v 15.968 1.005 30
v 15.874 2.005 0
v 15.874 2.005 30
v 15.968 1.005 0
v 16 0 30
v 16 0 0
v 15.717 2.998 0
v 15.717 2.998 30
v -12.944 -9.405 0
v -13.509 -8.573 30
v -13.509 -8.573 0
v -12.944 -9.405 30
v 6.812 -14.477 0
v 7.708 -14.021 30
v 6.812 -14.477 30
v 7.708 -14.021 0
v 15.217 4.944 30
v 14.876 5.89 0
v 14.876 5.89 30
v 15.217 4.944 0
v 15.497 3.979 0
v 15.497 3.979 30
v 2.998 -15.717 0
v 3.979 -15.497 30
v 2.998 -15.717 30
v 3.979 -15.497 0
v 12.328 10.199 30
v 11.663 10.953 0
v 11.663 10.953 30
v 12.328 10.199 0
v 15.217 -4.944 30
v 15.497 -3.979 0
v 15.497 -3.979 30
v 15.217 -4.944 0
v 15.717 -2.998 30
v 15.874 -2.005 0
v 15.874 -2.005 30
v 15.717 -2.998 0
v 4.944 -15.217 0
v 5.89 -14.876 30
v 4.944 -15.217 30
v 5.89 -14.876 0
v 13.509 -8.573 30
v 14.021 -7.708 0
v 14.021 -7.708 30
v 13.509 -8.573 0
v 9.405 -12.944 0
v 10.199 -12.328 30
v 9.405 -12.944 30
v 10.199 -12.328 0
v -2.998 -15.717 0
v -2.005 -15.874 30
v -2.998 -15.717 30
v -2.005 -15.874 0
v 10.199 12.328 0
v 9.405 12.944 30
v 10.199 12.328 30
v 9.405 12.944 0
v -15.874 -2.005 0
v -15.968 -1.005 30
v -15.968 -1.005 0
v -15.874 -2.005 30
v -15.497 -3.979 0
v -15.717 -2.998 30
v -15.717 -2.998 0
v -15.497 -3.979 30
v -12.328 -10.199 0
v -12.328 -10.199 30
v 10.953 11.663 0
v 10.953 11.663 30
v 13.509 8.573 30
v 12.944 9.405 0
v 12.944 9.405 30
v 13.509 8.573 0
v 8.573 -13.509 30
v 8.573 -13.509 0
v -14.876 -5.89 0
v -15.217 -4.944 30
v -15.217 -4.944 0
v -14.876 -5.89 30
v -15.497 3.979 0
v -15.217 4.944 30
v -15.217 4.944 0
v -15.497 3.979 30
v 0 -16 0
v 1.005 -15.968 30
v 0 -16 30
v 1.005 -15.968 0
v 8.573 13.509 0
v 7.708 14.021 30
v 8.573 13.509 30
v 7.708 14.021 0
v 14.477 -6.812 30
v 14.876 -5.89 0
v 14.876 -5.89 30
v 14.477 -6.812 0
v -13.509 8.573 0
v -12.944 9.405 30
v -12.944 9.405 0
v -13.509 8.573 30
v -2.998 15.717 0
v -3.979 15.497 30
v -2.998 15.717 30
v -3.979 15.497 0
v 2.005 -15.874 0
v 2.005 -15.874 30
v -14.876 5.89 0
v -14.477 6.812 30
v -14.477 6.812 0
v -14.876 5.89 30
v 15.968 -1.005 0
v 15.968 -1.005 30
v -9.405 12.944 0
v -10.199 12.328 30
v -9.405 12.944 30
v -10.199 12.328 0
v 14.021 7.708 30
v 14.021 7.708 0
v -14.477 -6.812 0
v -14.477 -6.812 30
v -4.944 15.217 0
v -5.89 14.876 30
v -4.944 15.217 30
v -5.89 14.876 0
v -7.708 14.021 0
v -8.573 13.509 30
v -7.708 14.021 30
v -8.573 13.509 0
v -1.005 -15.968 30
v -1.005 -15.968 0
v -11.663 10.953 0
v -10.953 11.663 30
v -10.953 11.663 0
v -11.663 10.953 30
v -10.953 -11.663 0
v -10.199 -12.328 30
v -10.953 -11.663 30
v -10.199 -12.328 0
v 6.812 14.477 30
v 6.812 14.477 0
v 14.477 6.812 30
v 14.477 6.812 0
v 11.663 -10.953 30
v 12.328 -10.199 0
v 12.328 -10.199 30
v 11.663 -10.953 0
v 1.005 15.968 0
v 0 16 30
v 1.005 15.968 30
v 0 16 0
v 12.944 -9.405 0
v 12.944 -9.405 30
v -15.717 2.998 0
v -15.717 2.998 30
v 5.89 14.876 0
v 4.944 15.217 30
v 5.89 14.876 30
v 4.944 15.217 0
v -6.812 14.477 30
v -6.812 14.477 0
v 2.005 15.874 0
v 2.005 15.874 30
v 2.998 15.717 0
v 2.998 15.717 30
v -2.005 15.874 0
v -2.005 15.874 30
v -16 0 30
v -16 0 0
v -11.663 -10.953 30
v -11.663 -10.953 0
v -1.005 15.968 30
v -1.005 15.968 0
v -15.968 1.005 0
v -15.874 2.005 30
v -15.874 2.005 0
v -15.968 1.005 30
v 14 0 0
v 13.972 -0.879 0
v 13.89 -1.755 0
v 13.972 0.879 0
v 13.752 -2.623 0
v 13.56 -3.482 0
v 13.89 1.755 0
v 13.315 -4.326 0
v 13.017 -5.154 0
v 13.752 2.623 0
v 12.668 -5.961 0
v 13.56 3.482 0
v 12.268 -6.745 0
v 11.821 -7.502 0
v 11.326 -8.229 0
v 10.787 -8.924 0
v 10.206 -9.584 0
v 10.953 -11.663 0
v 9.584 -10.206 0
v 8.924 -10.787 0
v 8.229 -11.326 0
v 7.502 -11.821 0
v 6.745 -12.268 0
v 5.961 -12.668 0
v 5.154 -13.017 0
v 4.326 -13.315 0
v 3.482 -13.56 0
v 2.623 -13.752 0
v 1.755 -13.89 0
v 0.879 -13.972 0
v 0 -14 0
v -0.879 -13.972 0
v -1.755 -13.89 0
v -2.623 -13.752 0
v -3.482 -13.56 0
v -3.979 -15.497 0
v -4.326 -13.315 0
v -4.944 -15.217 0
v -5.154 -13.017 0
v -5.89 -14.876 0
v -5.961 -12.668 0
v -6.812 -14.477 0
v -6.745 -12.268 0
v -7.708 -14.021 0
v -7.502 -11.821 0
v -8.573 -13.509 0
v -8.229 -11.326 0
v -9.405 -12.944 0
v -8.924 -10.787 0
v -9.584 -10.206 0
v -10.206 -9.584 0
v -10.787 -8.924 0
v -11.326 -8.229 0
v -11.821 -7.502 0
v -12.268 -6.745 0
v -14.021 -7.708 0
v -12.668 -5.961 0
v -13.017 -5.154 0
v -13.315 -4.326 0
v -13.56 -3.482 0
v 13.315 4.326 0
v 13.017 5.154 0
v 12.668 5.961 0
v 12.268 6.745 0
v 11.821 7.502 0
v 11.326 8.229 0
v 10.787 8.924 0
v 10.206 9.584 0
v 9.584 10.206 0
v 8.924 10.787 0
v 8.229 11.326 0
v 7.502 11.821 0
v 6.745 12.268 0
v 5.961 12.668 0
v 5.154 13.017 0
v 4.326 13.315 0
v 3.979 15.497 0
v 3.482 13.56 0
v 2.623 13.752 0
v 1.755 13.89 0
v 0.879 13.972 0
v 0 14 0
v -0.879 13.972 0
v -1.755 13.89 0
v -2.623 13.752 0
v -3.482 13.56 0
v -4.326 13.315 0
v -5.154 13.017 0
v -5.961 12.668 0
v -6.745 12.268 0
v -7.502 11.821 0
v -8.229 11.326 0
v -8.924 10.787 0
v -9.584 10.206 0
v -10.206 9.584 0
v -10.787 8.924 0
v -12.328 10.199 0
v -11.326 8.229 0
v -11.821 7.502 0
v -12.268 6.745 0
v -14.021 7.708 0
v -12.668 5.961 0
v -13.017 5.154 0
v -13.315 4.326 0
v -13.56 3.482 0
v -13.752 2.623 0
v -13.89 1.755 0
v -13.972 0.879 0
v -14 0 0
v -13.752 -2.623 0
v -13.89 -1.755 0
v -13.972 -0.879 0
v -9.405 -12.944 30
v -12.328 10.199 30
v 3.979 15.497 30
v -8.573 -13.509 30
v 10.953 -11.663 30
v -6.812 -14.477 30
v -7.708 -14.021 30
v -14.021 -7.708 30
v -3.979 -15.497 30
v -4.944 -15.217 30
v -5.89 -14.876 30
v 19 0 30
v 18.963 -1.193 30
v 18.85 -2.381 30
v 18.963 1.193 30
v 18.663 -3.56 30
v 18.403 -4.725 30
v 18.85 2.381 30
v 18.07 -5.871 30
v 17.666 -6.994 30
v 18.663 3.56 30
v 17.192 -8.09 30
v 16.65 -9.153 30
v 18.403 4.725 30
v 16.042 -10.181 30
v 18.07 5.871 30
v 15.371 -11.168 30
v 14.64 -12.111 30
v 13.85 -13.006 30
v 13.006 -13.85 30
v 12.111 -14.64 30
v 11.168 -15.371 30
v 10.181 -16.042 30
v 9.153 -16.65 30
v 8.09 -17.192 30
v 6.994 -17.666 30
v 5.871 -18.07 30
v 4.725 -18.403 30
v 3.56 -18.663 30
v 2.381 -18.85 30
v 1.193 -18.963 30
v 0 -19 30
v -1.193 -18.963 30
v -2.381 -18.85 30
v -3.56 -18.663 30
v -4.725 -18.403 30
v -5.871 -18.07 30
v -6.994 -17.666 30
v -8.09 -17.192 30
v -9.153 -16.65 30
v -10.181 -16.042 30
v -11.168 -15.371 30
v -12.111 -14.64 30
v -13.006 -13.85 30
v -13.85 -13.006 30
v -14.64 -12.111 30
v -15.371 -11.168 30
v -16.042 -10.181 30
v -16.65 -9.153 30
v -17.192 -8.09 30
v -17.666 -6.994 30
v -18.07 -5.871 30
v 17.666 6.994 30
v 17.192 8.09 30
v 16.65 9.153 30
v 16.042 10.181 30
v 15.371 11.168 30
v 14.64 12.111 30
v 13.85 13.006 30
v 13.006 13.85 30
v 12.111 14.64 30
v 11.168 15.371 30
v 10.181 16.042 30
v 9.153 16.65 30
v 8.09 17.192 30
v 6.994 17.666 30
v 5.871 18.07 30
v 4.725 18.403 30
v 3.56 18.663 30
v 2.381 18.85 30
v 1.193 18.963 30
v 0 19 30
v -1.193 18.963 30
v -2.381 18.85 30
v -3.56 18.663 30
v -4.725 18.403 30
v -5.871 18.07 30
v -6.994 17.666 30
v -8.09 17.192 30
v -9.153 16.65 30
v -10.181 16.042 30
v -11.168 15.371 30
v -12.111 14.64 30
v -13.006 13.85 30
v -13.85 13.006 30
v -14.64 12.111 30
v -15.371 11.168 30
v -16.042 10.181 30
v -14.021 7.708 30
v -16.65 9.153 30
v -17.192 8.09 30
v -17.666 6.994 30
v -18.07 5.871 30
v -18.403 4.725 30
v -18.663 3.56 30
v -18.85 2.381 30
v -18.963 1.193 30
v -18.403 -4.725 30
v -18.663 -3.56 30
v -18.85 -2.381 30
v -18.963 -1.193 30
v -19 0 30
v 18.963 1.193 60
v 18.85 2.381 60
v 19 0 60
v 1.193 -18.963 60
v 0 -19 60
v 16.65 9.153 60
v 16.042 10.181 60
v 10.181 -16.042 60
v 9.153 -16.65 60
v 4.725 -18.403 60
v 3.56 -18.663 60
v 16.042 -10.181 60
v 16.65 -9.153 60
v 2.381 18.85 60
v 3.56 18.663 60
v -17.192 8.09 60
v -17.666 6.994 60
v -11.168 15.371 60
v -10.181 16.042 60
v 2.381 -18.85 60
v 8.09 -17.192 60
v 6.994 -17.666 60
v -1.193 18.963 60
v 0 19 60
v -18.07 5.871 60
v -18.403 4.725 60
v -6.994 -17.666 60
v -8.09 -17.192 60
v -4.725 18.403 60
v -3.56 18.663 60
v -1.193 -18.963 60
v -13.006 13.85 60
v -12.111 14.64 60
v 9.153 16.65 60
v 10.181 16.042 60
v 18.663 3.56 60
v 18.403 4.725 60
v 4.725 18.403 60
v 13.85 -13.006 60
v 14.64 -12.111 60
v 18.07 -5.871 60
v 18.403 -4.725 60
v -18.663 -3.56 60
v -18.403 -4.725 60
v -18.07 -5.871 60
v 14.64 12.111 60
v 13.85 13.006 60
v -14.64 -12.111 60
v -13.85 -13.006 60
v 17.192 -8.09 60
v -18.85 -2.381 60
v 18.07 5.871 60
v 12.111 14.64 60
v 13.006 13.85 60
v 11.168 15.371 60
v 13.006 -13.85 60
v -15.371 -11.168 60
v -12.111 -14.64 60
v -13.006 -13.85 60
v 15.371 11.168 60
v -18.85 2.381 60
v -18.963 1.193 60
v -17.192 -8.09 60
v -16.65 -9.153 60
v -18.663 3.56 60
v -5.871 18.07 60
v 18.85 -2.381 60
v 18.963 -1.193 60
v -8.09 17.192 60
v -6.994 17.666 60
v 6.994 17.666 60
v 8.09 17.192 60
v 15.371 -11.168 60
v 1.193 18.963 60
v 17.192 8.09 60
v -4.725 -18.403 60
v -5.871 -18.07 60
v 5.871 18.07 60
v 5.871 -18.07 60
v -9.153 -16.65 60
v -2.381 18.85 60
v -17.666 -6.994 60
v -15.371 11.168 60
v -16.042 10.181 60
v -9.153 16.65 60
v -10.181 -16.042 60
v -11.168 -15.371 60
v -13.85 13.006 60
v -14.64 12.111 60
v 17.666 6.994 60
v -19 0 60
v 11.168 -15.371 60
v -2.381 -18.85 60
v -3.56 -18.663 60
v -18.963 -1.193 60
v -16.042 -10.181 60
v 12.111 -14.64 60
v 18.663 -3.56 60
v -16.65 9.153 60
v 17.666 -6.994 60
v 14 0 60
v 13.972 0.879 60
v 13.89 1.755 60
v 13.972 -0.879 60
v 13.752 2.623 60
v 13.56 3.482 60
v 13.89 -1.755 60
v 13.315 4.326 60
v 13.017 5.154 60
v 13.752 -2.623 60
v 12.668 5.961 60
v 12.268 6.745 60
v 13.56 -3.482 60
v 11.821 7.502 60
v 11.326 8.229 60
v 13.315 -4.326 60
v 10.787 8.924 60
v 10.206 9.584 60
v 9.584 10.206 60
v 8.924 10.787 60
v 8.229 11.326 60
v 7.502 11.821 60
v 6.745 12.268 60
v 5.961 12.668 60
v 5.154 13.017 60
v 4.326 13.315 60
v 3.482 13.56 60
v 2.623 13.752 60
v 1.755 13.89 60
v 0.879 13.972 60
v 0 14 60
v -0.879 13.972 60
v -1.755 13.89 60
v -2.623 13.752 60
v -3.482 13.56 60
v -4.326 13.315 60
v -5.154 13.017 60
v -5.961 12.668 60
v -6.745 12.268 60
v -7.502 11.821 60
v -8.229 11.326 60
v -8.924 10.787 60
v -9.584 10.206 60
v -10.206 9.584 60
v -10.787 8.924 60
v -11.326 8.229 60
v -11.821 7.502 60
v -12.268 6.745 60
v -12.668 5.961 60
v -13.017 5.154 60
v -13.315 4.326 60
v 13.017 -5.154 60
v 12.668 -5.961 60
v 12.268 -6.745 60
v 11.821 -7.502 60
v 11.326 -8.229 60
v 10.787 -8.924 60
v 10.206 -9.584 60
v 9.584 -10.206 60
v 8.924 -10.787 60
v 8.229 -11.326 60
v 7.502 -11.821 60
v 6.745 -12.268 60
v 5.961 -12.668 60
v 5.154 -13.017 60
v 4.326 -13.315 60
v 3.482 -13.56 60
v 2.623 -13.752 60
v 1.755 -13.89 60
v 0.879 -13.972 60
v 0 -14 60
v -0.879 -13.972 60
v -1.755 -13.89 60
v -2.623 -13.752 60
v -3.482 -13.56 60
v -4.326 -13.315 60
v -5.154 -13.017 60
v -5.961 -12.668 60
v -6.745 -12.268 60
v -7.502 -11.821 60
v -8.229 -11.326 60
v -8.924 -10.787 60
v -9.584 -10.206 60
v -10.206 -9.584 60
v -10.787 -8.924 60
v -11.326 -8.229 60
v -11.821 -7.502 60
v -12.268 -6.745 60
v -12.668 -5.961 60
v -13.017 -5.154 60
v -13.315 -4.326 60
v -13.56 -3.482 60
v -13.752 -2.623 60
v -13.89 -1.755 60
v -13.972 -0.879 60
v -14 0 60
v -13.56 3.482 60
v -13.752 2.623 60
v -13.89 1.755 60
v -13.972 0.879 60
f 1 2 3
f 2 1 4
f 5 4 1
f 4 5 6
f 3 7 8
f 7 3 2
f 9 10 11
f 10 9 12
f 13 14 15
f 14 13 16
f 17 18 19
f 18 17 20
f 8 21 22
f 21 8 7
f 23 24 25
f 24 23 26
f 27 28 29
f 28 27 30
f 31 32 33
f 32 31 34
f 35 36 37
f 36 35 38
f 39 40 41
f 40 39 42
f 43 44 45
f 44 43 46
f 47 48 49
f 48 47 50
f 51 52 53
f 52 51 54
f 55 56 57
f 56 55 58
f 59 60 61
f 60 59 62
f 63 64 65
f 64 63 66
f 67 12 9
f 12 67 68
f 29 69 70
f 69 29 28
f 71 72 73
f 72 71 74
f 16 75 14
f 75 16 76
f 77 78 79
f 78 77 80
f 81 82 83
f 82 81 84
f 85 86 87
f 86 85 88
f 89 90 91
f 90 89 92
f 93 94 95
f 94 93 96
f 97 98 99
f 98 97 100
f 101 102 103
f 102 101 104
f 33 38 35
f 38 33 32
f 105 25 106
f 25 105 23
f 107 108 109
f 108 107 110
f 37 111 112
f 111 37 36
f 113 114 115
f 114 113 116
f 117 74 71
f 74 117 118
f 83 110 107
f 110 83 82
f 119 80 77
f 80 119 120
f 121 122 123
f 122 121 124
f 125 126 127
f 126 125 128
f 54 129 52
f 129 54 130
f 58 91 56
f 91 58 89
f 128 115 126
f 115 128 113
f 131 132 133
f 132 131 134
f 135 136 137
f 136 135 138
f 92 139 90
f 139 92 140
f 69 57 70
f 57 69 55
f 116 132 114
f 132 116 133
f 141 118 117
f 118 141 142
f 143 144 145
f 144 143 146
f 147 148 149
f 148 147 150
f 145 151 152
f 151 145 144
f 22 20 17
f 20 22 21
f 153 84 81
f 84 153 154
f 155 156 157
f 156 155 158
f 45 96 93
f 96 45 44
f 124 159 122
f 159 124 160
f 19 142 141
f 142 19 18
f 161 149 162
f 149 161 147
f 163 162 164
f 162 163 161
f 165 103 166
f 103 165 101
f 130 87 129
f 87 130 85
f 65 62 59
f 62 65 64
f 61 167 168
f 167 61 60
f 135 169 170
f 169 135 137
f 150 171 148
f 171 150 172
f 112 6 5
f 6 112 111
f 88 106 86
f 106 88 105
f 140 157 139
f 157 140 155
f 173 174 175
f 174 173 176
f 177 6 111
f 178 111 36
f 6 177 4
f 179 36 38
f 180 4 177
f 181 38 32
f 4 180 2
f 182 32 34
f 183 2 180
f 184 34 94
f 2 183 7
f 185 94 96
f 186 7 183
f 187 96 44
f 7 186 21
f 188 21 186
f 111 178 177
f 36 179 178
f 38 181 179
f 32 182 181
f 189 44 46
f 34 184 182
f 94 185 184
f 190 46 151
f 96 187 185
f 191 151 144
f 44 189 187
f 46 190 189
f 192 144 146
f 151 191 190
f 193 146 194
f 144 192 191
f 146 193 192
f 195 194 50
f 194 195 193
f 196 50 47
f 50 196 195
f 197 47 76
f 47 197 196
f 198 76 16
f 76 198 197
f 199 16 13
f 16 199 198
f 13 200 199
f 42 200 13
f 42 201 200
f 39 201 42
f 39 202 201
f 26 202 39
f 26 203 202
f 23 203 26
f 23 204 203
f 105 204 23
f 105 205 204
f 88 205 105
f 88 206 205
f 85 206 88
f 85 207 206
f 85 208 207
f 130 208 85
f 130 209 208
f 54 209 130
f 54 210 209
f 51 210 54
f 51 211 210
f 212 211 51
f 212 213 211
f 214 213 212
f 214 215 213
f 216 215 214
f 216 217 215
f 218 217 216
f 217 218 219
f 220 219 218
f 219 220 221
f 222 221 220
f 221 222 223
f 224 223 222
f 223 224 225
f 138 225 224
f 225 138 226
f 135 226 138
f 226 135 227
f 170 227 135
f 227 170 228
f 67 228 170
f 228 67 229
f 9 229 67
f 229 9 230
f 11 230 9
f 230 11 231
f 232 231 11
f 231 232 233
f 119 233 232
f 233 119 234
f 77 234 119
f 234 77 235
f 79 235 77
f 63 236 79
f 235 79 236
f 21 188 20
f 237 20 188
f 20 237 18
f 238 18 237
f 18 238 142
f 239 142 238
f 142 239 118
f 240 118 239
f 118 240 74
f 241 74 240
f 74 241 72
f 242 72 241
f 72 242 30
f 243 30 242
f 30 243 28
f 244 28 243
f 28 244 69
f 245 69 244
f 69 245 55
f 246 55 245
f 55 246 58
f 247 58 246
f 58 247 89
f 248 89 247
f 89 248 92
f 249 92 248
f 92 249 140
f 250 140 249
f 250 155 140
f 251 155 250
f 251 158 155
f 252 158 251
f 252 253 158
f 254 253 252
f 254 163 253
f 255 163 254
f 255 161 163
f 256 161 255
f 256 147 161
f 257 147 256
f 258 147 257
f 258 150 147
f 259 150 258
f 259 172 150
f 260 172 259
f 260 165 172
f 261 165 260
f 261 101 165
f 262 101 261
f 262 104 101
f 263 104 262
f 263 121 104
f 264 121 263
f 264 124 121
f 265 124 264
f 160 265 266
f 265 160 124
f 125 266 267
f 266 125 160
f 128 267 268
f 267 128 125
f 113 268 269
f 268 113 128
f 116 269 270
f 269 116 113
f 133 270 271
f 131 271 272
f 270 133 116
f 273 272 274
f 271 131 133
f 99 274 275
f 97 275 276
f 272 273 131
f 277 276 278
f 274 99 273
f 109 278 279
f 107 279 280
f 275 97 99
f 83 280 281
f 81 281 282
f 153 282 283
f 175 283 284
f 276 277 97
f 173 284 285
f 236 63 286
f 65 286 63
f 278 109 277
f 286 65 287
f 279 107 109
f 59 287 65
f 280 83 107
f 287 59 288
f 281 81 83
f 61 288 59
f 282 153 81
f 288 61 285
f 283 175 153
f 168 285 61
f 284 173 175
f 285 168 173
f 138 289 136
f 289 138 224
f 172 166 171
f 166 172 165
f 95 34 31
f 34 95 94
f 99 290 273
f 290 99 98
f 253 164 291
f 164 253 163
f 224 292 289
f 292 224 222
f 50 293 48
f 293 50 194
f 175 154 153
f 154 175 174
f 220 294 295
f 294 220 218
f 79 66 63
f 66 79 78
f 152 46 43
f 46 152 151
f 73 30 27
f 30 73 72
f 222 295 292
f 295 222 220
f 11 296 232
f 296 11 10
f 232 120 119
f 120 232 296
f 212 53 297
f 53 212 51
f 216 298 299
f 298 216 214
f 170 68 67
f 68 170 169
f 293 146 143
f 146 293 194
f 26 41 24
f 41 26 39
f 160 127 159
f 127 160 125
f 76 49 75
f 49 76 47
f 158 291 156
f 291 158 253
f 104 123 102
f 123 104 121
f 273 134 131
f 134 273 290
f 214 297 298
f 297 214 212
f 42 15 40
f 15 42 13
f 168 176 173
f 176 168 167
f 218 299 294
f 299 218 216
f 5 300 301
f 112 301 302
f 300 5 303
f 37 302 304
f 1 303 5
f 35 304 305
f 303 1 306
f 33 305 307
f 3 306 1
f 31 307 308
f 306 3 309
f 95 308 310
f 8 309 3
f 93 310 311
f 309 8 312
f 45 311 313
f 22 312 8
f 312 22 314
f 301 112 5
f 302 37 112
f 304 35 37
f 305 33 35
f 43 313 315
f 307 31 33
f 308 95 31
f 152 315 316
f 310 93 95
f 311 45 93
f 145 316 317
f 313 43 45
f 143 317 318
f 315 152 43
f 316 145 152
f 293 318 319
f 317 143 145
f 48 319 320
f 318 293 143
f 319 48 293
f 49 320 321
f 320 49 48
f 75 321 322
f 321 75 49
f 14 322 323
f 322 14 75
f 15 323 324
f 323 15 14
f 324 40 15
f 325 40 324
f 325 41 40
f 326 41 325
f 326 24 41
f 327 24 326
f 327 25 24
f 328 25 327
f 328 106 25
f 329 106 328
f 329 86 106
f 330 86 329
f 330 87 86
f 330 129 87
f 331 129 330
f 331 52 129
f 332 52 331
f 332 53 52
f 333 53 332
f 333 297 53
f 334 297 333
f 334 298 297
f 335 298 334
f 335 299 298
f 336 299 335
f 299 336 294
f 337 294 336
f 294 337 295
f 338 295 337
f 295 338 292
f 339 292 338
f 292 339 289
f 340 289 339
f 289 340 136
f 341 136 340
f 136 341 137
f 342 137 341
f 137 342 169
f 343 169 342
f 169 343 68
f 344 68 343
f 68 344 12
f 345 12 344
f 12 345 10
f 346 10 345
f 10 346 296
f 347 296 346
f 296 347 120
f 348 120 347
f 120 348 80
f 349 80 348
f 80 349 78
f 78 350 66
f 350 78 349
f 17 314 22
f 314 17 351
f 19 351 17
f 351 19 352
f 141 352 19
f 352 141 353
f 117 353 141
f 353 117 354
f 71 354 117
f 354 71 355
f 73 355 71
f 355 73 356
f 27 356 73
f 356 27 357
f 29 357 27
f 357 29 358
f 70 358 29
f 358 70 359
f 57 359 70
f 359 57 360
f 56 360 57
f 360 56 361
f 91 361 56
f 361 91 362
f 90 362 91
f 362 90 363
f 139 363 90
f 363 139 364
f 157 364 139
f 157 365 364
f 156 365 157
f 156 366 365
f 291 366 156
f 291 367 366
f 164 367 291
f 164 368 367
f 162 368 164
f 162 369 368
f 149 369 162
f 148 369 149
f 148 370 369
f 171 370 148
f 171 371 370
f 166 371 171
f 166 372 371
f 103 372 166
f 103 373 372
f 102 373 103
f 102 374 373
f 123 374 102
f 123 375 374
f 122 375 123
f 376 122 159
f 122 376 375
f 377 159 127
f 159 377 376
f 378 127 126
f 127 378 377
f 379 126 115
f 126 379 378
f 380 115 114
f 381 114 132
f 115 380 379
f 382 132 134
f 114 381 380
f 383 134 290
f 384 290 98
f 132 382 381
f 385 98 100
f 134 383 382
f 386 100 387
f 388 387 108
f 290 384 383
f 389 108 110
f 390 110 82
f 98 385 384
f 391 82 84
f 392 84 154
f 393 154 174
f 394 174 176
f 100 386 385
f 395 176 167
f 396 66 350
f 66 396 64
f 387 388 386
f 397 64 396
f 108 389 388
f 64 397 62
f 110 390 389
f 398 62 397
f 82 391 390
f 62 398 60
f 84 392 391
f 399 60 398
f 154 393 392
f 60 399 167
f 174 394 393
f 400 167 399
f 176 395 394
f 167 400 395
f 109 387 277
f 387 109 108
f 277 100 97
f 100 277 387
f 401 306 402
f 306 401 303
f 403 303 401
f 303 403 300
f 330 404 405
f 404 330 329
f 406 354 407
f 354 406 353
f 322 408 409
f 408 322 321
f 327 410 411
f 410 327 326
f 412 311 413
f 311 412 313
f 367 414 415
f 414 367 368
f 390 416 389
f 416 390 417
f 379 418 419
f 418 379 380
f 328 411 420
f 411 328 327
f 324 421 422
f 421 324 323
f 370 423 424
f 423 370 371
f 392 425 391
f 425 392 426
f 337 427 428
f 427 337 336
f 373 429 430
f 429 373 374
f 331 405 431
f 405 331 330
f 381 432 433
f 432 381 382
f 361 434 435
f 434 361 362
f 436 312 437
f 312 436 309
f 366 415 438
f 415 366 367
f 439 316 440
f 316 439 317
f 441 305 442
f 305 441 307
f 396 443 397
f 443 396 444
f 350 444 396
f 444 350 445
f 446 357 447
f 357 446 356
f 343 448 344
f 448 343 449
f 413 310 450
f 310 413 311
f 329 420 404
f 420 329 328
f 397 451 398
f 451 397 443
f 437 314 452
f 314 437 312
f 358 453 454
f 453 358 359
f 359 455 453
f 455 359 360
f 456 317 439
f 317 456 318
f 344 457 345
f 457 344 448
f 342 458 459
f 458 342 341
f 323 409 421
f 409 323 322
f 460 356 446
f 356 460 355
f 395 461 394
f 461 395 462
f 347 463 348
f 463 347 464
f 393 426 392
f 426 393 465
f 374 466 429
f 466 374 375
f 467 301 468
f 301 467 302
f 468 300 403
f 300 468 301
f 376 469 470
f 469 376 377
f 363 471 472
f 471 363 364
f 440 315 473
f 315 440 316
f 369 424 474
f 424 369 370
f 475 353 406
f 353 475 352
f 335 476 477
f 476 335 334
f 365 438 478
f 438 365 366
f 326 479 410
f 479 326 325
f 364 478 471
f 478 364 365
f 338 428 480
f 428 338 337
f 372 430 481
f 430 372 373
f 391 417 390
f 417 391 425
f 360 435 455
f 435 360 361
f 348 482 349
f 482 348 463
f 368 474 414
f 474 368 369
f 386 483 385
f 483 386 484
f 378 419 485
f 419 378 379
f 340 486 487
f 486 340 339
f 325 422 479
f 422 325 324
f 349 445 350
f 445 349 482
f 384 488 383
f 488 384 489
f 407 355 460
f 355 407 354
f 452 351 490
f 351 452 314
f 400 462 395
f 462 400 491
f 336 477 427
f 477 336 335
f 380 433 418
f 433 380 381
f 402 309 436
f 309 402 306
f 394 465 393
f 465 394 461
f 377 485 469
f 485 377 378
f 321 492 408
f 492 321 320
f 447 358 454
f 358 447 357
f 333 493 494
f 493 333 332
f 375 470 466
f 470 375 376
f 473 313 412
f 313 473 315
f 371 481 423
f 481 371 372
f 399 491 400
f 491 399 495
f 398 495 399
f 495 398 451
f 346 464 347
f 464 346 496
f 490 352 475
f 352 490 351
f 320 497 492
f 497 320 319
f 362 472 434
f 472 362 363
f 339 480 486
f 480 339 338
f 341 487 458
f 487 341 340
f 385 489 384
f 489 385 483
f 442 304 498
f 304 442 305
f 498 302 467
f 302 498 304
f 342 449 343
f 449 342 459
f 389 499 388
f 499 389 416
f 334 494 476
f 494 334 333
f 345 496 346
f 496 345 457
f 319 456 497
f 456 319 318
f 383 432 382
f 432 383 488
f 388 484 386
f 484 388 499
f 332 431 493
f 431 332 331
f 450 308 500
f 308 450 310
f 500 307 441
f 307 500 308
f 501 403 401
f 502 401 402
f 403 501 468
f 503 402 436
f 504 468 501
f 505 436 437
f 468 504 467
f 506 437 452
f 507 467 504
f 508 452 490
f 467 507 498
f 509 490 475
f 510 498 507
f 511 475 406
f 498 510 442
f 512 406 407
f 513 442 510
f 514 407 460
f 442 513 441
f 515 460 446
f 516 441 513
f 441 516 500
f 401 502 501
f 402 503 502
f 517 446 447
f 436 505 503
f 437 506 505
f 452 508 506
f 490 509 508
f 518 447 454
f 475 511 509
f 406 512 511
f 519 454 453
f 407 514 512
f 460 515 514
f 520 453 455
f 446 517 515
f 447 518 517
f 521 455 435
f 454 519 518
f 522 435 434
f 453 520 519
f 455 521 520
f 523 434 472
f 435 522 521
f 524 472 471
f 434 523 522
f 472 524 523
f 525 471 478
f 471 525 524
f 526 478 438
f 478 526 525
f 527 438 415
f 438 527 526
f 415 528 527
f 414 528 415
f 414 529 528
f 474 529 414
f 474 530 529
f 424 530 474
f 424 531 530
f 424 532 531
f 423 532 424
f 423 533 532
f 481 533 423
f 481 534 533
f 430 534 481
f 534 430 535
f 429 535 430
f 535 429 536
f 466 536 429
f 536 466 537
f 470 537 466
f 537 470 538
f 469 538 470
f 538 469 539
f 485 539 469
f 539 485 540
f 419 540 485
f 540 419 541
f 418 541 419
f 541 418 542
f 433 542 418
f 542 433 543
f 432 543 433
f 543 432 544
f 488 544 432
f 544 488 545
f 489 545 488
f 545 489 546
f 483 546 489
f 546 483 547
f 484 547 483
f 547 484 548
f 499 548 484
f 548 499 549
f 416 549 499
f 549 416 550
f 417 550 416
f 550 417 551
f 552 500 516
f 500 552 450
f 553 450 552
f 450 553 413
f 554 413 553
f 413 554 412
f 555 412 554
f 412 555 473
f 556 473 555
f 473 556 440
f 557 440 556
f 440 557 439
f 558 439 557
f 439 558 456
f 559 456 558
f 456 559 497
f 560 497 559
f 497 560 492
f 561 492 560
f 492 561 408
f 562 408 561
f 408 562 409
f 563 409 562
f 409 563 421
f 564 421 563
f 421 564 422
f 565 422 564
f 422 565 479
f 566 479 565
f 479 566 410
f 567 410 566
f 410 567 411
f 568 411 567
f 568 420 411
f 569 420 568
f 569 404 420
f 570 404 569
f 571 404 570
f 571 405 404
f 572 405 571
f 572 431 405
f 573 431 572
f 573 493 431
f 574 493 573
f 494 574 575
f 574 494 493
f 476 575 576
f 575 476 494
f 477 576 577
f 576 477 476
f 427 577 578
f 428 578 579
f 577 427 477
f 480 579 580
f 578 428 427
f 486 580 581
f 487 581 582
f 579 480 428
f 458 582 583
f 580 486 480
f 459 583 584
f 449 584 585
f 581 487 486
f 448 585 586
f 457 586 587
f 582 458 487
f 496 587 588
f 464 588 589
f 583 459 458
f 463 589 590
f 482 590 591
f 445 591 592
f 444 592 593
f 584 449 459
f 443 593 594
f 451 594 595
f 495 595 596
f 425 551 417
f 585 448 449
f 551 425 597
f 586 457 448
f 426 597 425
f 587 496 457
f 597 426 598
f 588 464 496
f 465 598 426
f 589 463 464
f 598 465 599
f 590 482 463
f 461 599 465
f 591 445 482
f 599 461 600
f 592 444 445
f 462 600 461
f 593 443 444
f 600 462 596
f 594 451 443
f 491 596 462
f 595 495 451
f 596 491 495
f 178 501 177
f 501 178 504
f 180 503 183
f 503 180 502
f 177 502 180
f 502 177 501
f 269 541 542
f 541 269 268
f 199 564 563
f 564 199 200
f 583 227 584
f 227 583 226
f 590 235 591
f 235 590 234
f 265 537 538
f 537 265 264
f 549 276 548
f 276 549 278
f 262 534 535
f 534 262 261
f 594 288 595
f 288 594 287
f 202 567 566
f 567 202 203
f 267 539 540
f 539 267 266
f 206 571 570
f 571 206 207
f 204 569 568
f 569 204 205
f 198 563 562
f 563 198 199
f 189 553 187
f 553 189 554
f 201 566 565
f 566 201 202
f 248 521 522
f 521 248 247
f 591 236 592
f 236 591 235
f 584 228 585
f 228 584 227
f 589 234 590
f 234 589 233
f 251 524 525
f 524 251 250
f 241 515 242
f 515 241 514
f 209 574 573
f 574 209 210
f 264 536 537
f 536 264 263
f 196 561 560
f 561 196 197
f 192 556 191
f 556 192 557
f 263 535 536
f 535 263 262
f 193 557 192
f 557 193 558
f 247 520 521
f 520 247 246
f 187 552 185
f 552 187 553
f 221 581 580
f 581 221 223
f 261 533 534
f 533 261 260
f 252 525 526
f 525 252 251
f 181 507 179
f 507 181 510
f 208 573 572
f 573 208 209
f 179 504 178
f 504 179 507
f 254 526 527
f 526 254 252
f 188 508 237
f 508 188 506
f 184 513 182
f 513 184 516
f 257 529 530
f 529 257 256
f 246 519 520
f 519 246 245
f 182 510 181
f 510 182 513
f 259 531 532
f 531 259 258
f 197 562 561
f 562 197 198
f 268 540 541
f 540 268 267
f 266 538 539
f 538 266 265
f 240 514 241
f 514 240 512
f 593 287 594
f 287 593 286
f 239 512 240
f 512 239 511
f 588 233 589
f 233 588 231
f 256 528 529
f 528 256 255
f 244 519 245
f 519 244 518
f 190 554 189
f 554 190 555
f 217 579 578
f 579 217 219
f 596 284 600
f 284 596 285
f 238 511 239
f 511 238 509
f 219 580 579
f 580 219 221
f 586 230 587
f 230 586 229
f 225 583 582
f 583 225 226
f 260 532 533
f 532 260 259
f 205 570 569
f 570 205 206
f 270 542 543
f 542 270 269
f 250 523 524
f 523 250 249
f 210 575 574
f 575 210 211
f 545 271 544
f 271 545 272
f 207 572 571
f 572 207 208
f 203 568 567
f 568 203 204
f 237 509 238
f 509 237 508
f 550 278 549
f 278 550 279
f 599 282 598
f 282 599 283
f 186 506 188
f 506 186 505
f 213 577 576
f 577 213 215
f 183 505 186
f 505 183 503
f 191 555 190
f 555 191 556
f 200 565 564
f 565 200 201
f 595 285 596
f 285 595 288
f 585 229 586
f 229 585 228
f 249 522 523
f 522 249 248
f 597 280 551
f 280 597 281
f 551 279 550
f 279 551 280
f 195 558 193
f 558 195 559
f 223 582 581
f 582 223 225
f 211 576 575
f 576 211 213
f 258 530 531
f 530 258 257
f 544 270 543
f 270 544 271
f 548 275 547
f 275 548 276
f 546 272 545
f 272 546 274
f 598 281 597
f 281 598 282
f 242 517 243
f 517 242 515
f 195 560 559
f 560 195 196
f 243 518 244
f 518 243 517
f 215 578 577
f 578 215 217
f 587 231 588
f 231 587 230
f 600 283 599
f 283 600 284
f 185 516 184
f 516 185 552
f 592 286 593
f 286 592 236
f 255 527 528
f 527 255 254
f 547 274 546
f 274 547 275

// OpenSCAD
difference(){
    
    //forma deseada
union(){
cylinder(r=32/2,$fn=100,h=30);

translate([0,0,30])
cylinder(r=(32+6)/2,$fn=100,h=30);
    
}

//hueco interno
cylinder(r=(32/2)-2,$fn=100,h=60);

}
